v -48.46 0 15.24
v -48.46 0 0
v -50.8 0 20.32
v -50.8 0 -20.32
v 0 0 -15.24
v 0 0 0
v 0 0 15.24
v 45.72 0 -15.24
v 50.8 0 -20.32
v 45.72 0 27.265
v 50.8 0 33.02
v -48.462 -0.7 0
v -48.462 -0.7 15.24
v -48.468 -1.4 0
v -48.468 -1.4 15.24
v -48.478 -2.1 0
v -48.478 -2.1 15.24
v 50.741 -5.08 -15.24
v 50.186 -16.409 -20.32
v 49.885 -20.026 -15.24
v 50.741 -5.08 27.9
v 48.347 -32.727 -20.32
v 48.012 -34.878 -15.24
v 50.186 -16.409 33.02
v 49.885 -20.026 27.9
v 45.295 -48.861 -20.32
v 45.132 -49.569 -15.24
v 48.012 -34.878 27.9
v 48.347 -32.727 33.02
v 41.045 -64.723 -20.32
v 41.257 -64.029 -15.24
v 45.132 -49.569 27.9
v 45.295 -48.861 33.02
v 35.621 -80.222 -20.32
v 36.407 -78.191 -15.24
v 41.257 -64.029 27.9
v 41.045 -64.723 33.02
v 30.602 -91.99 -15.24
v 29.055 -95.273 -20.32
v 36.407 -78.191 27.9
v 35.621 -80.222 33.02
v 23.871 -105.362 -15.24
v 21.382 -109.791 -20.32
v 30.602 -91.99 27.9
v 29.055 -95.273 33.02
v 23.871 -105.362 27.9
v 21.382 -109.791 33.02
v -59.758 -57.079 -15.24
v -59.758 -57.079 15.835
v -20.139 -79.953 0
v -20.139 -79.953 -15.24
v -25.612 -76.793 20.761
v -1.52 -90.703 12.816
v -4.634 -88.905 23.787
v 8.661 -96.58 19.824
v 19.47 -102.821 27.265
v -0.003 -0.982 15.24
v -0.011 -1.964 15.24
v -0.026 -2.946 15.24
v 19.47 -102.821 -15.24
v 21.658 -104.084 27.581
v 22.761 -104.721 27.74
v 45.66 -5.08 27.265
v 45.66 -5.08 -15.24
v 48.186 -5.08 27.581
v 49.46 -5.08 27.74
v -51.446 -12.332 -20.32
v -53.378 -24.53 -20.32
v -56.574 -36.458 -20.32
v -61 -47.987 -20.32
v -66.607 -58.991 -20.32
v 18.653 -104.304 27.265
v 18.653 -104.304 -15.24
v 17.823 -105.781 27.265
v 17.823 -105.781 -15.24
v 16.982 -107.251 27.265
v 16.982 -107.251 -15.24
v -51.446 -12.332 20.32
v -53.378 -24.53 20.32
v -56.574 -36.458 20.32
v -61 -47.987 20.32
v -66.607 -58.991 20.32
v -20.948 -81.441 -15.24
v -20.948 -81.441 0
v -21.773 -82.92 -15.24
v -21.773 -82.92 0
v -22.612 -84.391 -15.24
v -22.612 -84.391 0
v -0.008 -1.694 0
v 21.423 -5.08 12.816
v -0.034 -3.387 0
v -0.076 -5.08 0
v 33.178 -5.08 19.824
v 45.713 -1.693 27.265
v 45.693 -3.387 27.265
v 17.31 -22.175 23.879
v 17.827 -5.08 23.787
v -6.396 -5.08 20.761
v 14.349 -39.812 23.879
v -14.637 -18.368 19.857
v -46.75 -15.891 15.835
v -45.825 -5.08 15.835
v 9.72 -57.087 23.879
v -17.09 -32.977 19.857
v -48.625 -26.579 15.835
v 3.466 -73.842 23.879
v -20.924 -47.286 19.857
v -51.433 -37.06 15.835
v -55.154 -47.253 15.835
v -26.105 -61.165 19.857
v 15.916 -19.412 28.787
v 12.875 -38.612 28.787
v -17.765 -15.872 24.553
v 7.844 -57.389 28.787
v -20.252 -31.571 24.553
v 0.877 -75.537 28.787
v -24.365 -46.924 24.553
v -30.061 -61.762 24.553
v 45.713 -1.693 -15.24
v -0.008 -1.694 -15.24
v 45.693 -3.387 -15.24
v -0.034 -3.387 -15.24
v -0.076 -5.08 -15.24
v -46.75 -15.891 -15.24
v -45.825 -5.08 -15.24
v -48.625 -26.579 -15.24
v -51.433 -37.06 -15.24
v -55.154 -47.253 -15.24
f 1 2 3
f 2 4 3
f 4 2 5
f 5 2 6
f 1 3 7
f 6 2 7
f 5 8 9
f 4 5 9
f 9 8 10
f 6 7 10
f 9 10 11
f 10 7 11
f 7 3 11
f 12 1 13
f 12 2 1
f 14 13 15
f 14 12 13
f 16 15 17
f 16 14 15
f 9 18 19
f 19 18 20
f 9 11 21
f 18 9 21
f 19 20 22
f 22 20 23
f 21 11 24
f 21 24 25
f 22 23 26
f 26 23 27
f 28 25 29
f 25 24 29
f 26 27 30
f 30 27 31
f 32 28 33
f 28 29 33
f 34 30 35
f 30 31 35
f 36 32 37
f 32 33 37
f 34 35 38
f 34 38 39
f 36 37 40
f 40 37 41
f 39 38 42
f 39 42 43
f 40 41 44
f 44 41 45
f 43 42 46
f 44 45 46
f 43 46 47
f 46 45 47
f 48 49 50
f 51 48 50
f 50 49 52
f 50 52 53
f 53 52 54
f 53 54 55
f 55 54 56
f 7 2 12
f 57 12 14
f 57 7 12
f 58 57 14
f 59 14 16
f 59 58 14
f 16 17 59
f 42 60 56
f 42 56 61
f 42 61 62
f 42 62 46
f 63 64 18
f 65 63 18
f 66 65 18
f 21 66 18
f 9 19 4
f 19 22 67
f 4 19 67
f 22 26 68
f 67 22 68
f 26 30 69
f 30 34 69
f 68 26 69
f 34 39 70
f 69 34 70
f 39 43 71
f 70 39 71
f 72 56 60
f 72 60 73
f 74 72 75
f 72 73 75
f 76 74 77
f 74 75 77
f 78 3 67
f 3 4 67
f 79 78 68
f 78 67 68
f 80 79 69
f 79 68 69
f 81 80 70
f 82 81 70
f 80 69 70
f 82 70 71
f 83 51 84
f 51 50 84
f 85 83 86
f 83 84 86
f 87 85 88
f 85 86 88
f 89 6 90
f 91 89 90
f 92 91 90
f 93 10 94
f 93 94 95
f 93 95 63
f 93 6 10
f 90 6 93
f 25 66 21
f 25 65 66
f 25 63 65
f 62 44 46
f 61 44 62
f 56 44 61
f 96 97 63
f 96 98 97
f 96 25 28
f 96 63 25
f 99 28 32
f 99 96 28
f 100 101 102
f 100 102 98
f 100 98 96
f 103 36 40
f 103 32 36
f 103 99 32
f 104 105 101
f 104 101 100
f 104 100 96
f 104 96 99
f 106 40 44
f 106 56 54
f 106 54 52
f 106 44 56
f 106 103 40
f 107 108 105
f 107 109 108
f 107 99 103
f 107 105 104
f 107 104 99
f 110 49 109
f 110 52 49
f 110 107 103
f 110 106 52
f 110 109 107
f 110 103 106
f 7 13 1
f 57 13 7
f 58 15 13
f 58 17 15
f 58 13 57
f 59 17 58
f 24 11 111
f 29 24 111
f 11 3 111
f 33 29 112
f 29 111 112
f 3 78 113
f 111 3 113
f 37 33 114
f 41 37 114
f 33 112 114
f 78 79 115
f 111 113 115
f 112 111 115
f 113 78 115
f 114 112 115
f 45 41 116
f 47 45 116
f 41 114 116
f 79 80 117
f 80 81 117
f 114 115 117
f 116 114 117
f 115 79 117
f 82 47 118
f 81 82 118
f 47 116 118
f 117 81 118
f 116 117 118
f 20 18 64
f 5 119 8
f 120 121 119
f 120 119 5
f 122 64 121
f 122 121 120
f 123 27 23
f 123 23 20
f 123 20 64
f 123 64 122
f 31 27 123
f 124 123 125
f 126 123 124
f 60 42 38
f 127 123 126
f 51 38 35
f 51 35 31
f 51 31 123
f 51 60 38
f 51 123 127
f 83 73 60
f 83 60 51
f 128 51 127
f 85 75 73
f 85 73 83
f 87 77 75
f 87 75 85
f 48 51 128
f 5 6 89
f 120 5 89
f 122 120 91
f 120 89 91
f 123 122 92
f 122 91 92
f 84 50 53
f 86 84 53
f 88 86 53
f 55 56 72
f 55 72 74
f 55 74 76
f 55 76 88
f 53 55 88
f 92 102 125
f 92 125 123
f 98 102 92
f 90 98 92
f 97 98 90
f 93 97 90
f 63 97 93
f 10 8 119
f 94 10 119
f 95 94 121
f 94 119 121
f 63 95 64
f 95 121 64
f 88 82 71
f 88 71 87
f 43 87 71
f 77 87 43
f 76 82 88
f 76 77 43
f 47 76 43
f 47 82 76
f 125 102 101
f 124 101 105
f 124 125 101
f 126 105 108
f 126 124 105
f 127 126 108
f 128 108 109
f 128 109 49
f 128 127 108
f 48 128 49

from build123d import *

# Parameters (mm, degrees)
F1_ANGLE = 30
F2_T     = -5.08
F6_ANGLE = 1


with BuildPart() as f1:
    # F0 (on Front) → F1 (revolve)
    with BuildSketch(Plane.XZ):
        Polygon((-50.8, -20.32), (50.8, -20.32), (50.8, 20.32), (50.8, 33.02), (-50.8, 20.32), align=None)
    revolve(axis=Axis((-168.781414628, 0, 147.0986076593), (0, 0, -1)), revolution_arc=F1_ANGLE)

    # F2
    f2_openings = [f1.faces().sort_by_distance(p)[0] for p in [
        (43.317945, -56.831852, 6.35),
    ]]
    offset(amount=F2_T, openings=f2_openings, kind=Kind.INTERSECTION)

    # F3 (on face) → F4 (revolve, cut)
    with BuildSketch(Plane(origin=(0, 0, 0), x_dir=(-1, 0, 0), z_dir=(0, 1, 0))):
        Polygon((0, 0), (-45.72, 27.2654663298), (-45.72, -15.24), (0, -15.24), align=None)
    revolve(axis=Axis((-168.781414628, 0, 147.0986076593), (0, 0, -1)), mode=Mode.SUBTRACT)

    # F5 (on face) → F6 (revolve, cut)
    with BuildSketch(Plane.XZ):
        Polygon((-48.460111432, 15.24), (-48.460111432, 0), (0, 15.24), align=None)
    revolve(axis=Axis((-168.781414628, 0, 147.0986076593), (0, 0, -1)), revolution_arc=F6_ANGLE, mode=Mode.SUBTRACT)


solid = f1.part
